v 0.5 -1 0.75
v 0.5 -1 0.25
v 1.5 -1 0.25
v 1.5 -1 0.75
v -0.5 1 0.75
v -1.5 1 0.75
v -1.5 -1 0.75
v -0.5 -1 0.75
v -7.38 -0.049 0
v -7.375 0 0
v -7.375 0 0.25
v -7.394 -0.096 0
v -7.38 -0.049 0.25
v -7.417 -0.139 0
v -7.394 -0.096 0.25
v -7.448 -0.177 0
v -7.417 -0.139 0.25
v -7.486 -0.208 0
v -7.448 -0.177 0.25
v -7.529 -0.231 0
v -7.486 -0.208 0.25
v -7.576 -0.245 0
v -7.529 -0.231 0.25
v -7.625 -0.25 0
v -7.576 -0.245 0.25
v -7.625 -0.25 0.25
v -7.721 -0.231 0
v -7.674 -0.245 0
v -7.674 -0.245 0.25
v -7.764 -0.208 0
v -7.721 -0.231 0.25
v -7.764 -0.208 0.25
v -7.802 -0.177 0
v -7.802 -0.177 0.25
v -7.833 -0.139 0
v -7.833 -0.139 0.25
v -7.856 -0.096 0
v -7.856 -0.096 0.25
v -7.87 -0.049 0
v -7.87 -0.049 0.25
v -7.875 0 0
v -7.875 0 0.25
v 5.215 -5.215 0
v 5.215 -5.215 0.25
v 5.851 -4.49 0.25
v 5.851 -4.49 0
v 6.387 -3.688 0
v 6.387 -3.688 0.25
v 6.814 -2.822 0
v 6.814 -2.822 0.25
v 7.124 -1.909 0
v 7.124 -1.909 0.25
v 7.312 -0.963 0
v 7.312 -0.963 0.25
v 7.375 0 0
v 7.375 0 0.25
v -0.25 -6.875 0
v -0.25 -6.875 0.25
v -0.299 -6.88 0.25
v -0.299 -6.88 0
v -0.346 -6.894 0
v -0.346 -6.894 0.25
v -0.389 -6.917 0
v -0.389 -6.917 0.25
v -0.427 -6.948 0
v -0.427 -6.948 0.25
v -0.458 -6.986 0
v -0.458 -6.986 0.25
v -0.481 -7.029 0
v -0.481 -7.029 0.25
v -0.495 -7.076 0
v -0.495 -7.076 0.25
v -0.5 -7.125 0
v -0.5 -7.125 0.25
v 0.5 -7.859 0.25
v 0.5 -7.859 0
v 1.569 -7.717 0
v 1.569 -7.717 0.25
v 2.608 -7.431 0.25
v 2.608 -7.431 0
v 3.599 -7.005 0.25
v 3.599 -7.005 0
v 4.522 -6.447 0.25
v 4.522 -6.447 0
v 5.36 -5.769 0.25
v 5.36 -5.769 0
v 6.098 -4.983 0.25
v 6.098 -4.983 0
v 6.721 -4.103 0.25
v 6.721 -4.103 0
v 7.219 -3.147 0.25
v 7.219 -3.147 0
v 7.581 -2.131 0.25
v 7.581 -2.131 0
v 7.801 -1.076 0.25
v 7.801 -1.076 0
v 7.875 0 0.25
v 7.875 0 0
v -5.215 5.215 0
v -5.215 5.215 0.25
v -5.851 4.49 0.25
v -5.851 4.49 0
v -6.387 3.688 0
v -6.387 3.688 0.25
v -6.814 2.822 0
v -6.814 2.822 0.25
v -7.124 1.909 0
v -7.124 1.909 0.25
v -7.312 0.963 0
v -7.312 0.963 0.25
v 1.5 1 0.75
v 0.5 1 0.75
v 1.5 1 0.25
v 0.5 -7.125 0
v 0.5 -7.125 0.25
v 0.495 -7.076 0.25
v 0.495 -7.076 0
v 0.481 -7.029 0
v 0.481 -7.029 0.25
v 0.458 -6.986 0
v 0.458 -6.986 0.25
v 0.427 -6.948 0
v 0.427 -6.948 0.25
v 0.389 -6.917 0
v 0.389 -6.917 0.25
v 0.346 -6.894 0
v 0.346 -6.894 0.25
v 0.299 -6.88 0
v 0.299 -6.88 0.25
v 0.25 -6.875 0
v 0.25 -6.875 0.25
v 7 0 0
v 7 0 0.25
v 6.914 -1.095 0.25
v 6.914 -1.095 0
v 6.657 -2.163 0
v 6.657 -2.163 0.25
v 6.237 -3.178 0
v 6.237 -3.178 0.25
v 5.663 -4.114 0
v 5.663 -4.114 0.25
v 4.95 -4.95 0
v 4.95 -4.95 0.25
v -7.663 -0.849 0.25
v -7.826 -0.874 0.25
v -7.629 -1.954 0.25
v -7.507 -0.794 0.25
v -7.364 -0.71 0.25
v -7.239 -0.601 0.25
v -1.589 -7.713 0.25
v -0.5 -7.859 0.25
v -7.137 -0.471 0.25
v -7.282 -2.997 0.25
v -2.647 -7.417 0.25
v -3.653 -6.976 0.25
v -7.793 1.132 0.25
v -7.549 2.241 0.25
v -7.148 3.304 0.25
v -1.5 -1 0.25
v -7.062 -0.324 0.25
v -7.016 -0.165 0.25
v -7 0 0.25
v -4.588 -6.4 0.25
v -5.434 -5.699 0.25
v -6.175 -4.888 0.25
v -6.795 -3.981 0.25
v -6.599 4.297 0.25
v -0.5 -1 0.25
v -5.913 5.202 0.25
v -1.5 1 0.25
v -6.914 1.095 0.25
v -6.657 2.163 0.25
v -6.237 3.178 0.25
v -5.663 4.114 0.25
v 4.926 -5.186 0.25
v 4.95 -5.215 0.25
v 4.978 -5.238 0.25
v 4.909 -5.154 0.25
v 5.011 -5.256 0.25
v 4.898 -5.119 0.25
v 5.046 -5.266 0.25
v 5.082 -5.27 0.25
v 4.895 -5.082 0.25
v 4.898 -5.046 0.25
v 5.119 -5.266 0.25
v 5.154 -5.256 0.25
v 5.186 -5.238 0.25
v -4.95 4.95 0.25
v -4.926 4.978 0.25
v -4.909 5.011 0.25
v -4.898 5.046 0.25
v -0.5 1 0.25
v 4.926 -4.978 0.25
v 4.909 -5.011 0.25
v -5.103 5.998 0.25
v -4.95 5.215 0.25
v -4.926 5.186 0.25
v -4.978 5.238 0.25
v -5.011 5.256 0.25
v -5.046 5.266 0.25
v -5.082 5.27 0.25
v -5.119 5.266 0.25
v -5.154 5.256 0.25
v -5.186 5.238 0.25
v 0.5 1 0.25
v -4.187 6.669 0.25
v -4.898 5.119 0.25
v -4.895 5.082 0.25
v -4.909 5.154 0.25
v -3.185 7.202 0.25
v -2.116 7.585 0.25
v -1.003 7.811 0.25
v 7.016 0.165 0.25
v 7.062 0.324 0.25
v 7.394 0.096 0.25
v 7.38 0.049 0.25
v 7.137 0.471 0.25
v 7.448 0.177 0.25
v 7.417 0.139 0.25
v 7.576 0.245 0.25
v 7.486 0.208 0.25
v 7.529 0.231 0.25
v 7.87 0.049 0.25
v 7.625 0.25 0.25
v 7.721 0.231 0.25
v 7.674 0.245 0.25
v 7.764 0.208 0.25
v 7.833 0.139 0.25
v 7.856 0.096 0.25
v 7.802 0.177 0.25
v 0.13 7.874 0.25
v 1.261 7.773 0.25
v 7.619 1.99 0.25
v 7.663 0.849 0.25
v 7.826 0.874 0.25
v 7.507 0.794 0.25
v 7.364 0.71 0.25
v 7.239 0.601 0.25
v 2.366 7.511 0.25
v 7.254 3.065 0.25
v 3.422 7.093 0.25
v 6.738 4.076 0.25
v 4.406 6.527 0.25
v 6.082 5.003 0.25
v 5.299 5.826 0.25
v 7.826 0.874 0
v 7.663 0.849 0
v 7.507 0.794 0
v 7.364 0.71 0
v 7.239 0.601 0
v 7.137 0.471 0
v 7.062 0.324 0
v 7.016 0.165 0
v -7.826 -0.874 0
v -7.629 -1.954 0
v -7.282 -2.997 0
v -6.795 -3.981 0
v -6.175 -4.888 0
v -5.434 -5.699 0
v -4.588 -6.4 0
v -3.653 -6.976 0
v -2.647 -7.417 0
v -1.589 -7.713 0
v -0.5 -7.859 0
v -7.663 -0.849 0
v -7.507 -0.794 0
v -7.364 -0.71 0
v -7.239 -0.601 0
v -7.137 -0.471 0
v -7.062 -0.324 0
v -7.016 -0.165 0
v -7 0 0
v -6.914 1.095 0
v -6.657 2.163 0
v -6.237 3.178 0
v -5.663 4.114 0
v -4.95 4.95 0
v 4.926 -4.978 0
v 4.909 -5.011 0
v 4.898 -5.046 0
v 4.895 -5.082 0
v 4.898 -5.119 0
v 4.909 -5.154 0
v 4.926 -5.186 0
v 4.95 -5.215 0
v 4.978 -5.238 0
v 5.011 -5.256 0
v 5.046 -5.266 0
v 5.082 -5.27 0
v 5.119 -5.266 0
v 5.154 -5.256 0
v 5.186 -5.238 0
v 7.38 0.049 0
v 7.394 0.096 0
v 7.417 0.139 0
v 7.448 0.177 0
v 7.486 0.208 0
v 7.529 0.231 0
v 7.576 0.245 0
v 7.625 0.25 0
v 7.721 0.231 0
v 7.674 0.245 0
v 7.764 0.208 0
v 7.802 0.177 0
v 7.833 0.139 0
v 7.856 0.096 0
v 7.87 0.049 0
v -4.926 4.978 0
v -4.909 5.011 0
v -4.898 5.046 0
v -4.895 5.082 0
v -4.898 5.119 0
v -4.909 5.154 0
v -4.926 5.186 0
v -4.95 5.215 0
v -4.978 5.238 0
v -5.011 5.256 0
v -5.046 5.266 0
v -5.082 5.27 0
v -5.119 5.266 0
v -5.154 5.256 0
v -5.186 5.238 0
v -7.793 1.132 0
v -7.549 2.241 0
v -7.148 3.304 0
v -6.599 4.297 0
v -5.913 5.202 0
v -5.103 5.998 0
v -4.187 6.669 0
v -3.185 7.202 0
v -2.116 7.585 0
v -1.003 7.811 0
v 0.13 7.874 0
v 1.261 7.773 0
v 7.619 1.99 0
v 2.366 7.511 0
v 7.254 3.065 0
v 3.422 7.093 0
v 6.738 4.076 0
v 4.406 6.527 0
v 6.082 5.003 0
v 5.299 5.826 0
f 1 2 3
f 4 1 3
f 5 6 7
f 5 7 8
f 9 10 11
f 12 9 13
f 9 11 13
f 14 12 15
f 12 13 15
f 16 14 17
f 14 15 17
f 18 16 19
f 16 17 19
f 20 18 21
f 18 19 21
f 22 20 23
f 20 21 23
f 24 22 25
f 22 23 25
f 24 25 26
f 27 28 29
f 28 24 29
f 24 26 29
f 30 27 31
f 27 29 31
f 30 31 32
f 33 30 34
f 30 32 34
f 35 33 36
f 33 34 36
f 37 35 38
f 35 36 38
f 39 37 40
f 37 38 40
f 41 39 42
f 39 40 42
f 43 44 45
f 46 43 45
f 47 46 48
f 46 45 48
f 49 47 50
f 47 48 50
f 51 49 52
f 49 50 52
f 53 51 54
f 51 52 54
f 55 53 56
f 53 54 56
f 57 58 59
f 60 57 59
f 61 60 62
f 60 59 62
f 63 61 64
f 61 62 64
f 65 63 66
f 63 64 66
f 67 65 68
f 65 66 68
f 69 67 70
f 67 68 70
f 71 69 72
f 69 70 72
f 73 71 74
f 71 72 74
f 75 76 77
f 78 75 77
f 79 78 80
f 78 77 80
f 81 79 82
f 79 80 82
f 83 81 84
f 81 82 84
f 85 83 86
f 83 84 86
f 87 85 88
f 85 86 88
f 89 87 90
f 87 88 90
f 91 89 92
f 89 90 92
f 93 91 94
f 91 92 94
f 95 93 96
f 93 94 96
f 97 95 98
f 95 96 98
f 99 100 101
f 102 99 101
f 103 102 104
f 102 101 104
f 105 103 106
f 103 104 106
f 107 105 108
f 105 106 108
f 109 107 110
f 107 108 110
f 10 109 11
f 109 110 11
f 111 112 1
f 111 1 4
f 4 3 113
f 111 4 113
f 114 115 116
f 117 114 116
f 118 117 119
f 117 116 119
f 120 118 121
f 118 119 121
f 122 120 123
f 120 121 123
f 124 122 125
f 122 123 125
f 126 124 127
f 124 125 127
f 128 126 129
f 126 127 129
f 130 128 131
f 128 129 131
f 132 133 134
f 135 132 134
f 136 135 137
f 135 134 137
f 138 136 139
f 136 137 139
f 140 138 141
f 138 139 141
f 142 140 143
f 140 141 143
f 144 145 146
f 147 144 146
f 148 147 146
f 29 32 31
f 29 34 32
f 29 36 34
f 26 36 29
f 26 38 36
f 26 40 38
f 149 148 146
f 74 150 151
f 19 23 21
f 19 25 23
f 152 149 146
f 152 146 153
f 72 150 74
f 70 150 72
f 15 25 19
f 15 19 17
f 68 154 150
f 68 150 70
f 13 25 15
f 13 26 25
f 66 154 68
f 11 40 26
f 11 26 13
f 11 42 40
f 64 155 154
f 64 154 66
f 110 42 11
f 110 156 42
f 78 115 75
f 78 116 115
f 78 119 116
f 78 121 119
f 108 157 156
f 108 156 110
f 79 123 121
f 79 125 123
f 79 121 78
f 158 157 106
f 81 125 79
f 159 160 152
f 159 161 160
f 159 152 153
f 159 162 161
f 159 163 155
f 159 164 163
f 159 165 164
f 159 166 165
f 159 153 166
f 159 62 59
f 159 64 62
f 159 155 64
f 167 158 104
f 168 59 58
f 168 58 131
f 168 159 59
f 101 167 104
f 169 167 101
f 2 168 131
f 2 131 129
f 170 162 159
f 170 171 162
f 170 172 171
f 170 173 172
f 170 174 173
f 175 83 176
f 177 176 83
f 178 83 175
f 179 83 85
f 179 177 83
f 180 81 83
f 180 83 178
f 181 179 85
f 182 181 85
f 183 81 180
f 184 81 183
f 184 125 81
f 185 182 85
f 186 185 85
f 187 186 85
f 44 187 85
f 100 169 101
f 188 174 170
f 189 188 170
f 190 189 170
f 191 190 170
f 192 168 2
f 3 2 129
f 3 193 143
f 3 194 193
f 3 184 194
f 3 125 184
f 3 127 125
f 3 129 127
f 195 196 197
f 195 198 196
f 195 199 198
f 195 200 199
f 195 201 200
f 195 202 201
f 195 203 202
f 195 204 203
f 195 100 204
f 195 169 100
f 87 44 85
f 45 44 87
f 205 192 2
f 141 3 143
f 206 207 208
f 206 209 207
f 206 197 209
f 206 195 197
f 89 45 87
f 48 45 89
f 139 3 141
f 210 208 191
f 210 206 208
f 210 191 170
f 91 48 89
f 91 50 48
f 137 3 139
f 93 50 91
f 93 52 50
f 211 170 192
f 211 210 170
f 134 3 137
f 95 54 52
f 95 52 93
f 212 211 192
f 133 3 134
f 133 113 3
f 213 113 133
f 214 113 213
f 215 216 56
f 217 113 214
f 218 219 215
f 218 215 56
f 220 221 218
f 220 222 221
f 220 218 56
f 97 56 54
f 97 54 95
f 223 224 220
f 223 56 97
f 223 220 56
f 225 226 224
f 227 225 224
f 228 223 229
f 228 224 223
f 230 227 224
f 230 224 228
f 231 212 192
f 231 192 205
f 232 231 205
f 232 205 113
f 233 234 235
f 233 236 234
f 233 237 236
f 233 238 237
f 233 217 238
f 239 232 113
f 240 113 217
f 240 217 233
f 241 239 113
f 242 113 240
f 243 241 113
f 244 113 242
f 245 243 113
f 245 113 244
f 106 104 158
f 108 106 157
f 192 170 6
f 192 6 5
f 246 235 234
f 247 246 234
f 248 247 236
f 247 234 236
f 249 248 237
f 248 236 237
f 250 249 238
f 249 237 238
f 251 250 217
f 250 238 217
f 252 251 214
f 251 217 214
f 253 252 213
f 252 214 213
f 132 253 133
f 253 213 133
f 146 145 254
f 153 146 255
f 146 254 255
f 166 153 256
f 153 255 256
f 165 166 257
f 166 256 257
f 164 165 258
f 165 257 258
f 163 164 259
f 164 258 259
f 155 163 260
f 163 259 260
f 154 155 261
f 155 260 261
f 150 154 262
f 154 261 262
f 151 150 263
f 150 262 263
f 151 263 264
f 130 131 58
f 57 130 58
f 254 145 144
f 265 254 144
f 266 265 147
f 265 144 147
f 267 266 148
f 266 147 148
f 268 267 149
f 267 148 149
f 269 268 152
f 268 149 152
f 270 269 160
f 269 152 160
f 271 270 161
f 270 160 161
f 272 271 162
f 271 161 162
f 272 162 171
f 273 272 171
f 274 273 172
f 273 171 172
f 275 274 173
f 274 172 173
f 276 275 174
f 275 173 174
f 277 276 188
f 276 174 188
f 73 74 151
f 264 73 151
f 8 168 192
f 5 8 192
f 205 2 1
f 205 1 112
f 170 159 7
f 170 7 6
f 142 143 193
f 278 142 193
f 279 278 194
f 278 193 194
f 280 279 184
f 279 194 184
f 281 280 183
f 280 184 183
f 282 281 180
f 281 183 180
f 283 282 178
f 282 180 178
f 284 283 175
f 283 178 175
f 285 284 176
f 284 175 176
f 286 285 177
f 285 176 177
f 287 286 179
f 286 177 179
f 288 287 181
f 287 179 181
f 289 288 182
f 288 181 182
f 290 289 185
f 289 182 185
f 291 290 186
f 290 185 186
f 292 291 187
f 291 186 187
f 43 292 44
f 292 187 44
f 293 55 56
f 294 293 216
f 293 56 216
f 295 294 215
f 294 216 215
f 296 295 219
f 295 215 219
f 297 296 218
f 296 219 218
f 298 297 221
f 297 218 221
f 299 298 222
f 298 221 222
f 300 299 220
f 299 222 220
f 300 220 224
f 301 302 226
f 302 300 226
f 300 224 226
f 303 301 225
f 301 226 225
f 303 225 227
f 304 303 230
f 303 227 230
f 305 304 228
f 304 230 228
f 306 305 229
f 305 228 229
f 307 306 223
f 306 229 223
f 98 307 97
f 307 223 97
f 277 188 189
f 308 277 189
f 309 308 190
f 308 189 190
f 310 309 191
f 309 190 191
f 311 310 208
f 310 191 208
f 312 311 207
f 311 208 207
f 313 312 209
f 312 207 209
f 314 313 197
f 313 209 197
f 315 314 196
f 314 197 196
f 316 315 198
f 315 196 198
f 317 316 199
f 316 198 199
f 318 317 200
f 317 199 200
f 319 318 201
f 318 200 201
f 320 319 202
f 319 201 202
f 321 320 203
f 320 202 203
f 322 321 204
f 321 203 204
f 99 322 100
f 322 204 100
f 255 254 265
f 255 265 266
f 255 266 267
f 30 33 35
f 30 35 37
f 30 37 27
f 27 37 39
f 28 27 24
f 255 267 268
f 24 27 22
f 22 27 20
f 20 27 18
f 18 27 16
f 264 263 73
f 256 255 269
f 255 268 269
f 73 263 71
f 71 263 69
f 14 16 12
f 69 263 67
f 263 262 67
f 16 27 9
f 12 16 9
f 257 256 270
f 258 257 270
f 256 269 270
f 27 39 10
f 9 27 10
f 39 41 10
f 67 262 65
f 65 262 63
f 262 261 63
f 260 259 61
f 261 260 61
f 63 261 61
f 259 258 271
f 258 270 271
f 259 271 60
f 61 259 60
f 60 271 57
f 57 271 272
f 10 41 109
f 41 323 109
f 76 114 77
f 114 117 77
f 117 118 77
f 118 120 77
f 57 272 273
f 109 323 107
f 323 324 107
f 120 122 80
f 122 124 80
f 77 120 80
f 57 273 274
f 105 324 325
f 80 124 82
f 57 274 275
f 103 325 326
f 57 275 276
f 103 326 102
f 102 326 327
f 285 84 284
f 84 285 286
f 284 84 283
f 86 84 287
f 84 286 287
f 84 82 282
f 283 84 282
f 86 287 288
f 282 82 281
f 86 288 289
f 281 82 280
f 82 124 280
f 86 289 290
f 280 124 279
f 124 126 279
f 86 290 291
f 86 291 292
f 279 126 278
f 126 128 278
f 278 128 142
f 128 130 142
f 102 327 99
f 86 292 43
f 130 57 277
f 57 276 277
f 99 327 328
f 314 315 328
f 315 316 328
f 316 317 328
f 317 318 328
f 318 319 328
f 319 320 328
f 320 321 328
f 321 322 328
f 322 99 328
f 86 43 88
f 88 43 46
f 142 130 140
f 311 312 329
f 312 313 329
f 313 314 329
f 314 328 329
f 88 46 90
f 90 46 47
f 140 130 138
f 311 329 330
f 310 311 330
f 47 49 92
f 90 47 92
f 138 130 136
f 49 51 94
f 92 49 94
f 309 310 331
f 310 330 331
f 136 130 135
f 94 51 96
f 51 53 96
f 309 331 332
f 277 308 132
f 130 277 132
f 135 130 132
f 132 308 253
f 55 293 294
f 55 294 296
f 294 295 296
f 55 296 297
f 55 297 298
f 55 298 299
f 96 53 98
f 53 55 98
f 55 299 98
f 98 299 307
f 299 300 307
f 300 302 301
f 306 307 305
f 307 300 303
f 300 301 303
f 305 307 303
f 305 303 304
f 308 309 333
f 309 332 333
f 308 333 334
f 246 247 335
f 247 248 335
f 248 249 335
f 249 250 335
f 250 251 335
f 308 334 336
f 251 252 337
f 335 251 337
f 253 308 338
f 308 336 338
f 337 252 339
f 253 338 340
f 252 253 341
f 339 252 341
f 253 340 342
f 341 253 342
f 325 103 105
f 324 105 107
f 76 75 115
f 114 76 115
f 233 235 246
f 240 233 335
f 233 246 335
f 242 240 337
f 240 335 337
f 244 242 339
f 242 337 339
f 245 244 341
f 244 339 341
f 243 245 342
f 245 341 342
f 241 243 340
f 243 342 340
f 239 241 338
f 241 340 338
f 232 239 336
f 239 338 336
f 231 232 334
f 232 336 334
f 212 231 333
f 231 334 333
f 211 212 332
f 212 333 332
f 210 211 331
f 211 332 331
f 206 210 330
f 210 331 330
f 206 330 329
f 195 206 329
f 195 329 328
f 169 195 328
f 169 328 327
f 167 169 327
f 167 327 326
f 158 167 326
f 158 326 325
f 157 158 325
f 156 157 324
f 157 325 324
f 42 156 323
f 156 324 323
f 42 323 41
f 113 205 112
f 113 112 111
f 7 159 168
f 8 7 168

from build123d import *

# Parameters (mm, degrees)
F0_R     = 7.875
F1_DEPTH = 0.25
F2_W     = 1
F2_H     = 2
F3_DEPTH = 0.5
F5_DEPTH = 0.5
F7_DEPTH = 1


# Not quite as in the source:
# - a feature names something its author has since deleted; it is built from what else it names


with BuildPart() as f1:
    # F0 (on Top) → F1 (new body)
    with BuildSketch(Plane.XY):
        Circle(F0_R)
    extrude(amount=F1_DEPTH)

    # F2 (on face) → F3 (join)
    with BuildSketch(Plane.XY.offset(0.25)):
        with Locations((-1, 0)):
            Rectangle(F2_W, F2_H)
        with Locations((1, 0)):
            Rectangle(F2_W, F2_H)
    extrude(amount=F3_DEPTH)

    # F4 (on face) → F5 (cut)
    with BuildSketch(Plane.XY.offset(0.25)):
        with BuildLine():
            ThreePointArc((-0.5, -7.8591109548), (0, -7.875), (0.5, -7.8591109548))
            Line((0.5, -7.8591109548), (0.5, -7.125))
            ThreePointArc((0.5, -7.125), (0.4267766953, -6.9482233047), (0.25, -6.875))
            Line((0.25, -6.875), (-0.25, -6.875))
            ThreePointArc((-0.25, -6.875), (-0.4267766953, -6.9482233047), (-0.5, -7.125))
            Line((-0.5, -7.125), (-0.5, -7.8591109548))
        make_face()
    extrude(amount=-F5_DEPTH, mode=Mode.SUBTRACT)

    # F6 (on face) → F7 (cut)
    with BuildSketch(Plane.XY.offset(0.25)):
        with BuildLine():
            ThreePointArc((-5.2149125113, 5.2149125113), (-6.8136115523, 2.8222903137), (-7.375, 0))
            ThreePointArc((-7.375, 0), (-7.625, -0.25), (-7.875, 0))
            ThreePointArc((-7.875, 0), (-7.8628378306, -0.4375), (-7.8263888889, -0.8736486478))
            ThreePointArc((-7.8263888889, -0.8736486478), (-7.2393272374, -0.6012862371), (-7, 0))
            ThreePointArc((-7, 0), (-6.4671567276, 2.6787840266), (-4.9497474683, 4.9497474683))
            ThreePointArc((-4.9497474683, 4.9497474683), (-4.9497474683, 5.2149125113), (-5.2149125113, 5.2149125113))
        make_face()
        with BuildLine():
            ThreePointArc((7.875, 0), (7.8628378306, 0.4375), (7.8263888889, 0.8736486478))
            ThreePointArc((7.8263888889, 0.8736486478), (7.2393272374, 0.6012862371), (7, 0))
            ThreePointArc((7, 0), (6.4671567276, -2.6787840266), (4.9497474683, -4.9497474683))
            ThreePointArc((4.9497474683, -4.9497474683), (4.9497474683, -5.2149125113), (5.2149125113, -5.2149125113))
            ThreePointArc((5.2149125113, -5.2149125113), (6.8136115523, -2.8222903137), (7.375, 0))
            ThreePointArc((7.375, 0), (7.625, 0.25), (7.875, 0))
        make_face()
    extrude(amount=-F7_DEPTH, mode=Mode.SUBTRACT)


solid = f1.part
